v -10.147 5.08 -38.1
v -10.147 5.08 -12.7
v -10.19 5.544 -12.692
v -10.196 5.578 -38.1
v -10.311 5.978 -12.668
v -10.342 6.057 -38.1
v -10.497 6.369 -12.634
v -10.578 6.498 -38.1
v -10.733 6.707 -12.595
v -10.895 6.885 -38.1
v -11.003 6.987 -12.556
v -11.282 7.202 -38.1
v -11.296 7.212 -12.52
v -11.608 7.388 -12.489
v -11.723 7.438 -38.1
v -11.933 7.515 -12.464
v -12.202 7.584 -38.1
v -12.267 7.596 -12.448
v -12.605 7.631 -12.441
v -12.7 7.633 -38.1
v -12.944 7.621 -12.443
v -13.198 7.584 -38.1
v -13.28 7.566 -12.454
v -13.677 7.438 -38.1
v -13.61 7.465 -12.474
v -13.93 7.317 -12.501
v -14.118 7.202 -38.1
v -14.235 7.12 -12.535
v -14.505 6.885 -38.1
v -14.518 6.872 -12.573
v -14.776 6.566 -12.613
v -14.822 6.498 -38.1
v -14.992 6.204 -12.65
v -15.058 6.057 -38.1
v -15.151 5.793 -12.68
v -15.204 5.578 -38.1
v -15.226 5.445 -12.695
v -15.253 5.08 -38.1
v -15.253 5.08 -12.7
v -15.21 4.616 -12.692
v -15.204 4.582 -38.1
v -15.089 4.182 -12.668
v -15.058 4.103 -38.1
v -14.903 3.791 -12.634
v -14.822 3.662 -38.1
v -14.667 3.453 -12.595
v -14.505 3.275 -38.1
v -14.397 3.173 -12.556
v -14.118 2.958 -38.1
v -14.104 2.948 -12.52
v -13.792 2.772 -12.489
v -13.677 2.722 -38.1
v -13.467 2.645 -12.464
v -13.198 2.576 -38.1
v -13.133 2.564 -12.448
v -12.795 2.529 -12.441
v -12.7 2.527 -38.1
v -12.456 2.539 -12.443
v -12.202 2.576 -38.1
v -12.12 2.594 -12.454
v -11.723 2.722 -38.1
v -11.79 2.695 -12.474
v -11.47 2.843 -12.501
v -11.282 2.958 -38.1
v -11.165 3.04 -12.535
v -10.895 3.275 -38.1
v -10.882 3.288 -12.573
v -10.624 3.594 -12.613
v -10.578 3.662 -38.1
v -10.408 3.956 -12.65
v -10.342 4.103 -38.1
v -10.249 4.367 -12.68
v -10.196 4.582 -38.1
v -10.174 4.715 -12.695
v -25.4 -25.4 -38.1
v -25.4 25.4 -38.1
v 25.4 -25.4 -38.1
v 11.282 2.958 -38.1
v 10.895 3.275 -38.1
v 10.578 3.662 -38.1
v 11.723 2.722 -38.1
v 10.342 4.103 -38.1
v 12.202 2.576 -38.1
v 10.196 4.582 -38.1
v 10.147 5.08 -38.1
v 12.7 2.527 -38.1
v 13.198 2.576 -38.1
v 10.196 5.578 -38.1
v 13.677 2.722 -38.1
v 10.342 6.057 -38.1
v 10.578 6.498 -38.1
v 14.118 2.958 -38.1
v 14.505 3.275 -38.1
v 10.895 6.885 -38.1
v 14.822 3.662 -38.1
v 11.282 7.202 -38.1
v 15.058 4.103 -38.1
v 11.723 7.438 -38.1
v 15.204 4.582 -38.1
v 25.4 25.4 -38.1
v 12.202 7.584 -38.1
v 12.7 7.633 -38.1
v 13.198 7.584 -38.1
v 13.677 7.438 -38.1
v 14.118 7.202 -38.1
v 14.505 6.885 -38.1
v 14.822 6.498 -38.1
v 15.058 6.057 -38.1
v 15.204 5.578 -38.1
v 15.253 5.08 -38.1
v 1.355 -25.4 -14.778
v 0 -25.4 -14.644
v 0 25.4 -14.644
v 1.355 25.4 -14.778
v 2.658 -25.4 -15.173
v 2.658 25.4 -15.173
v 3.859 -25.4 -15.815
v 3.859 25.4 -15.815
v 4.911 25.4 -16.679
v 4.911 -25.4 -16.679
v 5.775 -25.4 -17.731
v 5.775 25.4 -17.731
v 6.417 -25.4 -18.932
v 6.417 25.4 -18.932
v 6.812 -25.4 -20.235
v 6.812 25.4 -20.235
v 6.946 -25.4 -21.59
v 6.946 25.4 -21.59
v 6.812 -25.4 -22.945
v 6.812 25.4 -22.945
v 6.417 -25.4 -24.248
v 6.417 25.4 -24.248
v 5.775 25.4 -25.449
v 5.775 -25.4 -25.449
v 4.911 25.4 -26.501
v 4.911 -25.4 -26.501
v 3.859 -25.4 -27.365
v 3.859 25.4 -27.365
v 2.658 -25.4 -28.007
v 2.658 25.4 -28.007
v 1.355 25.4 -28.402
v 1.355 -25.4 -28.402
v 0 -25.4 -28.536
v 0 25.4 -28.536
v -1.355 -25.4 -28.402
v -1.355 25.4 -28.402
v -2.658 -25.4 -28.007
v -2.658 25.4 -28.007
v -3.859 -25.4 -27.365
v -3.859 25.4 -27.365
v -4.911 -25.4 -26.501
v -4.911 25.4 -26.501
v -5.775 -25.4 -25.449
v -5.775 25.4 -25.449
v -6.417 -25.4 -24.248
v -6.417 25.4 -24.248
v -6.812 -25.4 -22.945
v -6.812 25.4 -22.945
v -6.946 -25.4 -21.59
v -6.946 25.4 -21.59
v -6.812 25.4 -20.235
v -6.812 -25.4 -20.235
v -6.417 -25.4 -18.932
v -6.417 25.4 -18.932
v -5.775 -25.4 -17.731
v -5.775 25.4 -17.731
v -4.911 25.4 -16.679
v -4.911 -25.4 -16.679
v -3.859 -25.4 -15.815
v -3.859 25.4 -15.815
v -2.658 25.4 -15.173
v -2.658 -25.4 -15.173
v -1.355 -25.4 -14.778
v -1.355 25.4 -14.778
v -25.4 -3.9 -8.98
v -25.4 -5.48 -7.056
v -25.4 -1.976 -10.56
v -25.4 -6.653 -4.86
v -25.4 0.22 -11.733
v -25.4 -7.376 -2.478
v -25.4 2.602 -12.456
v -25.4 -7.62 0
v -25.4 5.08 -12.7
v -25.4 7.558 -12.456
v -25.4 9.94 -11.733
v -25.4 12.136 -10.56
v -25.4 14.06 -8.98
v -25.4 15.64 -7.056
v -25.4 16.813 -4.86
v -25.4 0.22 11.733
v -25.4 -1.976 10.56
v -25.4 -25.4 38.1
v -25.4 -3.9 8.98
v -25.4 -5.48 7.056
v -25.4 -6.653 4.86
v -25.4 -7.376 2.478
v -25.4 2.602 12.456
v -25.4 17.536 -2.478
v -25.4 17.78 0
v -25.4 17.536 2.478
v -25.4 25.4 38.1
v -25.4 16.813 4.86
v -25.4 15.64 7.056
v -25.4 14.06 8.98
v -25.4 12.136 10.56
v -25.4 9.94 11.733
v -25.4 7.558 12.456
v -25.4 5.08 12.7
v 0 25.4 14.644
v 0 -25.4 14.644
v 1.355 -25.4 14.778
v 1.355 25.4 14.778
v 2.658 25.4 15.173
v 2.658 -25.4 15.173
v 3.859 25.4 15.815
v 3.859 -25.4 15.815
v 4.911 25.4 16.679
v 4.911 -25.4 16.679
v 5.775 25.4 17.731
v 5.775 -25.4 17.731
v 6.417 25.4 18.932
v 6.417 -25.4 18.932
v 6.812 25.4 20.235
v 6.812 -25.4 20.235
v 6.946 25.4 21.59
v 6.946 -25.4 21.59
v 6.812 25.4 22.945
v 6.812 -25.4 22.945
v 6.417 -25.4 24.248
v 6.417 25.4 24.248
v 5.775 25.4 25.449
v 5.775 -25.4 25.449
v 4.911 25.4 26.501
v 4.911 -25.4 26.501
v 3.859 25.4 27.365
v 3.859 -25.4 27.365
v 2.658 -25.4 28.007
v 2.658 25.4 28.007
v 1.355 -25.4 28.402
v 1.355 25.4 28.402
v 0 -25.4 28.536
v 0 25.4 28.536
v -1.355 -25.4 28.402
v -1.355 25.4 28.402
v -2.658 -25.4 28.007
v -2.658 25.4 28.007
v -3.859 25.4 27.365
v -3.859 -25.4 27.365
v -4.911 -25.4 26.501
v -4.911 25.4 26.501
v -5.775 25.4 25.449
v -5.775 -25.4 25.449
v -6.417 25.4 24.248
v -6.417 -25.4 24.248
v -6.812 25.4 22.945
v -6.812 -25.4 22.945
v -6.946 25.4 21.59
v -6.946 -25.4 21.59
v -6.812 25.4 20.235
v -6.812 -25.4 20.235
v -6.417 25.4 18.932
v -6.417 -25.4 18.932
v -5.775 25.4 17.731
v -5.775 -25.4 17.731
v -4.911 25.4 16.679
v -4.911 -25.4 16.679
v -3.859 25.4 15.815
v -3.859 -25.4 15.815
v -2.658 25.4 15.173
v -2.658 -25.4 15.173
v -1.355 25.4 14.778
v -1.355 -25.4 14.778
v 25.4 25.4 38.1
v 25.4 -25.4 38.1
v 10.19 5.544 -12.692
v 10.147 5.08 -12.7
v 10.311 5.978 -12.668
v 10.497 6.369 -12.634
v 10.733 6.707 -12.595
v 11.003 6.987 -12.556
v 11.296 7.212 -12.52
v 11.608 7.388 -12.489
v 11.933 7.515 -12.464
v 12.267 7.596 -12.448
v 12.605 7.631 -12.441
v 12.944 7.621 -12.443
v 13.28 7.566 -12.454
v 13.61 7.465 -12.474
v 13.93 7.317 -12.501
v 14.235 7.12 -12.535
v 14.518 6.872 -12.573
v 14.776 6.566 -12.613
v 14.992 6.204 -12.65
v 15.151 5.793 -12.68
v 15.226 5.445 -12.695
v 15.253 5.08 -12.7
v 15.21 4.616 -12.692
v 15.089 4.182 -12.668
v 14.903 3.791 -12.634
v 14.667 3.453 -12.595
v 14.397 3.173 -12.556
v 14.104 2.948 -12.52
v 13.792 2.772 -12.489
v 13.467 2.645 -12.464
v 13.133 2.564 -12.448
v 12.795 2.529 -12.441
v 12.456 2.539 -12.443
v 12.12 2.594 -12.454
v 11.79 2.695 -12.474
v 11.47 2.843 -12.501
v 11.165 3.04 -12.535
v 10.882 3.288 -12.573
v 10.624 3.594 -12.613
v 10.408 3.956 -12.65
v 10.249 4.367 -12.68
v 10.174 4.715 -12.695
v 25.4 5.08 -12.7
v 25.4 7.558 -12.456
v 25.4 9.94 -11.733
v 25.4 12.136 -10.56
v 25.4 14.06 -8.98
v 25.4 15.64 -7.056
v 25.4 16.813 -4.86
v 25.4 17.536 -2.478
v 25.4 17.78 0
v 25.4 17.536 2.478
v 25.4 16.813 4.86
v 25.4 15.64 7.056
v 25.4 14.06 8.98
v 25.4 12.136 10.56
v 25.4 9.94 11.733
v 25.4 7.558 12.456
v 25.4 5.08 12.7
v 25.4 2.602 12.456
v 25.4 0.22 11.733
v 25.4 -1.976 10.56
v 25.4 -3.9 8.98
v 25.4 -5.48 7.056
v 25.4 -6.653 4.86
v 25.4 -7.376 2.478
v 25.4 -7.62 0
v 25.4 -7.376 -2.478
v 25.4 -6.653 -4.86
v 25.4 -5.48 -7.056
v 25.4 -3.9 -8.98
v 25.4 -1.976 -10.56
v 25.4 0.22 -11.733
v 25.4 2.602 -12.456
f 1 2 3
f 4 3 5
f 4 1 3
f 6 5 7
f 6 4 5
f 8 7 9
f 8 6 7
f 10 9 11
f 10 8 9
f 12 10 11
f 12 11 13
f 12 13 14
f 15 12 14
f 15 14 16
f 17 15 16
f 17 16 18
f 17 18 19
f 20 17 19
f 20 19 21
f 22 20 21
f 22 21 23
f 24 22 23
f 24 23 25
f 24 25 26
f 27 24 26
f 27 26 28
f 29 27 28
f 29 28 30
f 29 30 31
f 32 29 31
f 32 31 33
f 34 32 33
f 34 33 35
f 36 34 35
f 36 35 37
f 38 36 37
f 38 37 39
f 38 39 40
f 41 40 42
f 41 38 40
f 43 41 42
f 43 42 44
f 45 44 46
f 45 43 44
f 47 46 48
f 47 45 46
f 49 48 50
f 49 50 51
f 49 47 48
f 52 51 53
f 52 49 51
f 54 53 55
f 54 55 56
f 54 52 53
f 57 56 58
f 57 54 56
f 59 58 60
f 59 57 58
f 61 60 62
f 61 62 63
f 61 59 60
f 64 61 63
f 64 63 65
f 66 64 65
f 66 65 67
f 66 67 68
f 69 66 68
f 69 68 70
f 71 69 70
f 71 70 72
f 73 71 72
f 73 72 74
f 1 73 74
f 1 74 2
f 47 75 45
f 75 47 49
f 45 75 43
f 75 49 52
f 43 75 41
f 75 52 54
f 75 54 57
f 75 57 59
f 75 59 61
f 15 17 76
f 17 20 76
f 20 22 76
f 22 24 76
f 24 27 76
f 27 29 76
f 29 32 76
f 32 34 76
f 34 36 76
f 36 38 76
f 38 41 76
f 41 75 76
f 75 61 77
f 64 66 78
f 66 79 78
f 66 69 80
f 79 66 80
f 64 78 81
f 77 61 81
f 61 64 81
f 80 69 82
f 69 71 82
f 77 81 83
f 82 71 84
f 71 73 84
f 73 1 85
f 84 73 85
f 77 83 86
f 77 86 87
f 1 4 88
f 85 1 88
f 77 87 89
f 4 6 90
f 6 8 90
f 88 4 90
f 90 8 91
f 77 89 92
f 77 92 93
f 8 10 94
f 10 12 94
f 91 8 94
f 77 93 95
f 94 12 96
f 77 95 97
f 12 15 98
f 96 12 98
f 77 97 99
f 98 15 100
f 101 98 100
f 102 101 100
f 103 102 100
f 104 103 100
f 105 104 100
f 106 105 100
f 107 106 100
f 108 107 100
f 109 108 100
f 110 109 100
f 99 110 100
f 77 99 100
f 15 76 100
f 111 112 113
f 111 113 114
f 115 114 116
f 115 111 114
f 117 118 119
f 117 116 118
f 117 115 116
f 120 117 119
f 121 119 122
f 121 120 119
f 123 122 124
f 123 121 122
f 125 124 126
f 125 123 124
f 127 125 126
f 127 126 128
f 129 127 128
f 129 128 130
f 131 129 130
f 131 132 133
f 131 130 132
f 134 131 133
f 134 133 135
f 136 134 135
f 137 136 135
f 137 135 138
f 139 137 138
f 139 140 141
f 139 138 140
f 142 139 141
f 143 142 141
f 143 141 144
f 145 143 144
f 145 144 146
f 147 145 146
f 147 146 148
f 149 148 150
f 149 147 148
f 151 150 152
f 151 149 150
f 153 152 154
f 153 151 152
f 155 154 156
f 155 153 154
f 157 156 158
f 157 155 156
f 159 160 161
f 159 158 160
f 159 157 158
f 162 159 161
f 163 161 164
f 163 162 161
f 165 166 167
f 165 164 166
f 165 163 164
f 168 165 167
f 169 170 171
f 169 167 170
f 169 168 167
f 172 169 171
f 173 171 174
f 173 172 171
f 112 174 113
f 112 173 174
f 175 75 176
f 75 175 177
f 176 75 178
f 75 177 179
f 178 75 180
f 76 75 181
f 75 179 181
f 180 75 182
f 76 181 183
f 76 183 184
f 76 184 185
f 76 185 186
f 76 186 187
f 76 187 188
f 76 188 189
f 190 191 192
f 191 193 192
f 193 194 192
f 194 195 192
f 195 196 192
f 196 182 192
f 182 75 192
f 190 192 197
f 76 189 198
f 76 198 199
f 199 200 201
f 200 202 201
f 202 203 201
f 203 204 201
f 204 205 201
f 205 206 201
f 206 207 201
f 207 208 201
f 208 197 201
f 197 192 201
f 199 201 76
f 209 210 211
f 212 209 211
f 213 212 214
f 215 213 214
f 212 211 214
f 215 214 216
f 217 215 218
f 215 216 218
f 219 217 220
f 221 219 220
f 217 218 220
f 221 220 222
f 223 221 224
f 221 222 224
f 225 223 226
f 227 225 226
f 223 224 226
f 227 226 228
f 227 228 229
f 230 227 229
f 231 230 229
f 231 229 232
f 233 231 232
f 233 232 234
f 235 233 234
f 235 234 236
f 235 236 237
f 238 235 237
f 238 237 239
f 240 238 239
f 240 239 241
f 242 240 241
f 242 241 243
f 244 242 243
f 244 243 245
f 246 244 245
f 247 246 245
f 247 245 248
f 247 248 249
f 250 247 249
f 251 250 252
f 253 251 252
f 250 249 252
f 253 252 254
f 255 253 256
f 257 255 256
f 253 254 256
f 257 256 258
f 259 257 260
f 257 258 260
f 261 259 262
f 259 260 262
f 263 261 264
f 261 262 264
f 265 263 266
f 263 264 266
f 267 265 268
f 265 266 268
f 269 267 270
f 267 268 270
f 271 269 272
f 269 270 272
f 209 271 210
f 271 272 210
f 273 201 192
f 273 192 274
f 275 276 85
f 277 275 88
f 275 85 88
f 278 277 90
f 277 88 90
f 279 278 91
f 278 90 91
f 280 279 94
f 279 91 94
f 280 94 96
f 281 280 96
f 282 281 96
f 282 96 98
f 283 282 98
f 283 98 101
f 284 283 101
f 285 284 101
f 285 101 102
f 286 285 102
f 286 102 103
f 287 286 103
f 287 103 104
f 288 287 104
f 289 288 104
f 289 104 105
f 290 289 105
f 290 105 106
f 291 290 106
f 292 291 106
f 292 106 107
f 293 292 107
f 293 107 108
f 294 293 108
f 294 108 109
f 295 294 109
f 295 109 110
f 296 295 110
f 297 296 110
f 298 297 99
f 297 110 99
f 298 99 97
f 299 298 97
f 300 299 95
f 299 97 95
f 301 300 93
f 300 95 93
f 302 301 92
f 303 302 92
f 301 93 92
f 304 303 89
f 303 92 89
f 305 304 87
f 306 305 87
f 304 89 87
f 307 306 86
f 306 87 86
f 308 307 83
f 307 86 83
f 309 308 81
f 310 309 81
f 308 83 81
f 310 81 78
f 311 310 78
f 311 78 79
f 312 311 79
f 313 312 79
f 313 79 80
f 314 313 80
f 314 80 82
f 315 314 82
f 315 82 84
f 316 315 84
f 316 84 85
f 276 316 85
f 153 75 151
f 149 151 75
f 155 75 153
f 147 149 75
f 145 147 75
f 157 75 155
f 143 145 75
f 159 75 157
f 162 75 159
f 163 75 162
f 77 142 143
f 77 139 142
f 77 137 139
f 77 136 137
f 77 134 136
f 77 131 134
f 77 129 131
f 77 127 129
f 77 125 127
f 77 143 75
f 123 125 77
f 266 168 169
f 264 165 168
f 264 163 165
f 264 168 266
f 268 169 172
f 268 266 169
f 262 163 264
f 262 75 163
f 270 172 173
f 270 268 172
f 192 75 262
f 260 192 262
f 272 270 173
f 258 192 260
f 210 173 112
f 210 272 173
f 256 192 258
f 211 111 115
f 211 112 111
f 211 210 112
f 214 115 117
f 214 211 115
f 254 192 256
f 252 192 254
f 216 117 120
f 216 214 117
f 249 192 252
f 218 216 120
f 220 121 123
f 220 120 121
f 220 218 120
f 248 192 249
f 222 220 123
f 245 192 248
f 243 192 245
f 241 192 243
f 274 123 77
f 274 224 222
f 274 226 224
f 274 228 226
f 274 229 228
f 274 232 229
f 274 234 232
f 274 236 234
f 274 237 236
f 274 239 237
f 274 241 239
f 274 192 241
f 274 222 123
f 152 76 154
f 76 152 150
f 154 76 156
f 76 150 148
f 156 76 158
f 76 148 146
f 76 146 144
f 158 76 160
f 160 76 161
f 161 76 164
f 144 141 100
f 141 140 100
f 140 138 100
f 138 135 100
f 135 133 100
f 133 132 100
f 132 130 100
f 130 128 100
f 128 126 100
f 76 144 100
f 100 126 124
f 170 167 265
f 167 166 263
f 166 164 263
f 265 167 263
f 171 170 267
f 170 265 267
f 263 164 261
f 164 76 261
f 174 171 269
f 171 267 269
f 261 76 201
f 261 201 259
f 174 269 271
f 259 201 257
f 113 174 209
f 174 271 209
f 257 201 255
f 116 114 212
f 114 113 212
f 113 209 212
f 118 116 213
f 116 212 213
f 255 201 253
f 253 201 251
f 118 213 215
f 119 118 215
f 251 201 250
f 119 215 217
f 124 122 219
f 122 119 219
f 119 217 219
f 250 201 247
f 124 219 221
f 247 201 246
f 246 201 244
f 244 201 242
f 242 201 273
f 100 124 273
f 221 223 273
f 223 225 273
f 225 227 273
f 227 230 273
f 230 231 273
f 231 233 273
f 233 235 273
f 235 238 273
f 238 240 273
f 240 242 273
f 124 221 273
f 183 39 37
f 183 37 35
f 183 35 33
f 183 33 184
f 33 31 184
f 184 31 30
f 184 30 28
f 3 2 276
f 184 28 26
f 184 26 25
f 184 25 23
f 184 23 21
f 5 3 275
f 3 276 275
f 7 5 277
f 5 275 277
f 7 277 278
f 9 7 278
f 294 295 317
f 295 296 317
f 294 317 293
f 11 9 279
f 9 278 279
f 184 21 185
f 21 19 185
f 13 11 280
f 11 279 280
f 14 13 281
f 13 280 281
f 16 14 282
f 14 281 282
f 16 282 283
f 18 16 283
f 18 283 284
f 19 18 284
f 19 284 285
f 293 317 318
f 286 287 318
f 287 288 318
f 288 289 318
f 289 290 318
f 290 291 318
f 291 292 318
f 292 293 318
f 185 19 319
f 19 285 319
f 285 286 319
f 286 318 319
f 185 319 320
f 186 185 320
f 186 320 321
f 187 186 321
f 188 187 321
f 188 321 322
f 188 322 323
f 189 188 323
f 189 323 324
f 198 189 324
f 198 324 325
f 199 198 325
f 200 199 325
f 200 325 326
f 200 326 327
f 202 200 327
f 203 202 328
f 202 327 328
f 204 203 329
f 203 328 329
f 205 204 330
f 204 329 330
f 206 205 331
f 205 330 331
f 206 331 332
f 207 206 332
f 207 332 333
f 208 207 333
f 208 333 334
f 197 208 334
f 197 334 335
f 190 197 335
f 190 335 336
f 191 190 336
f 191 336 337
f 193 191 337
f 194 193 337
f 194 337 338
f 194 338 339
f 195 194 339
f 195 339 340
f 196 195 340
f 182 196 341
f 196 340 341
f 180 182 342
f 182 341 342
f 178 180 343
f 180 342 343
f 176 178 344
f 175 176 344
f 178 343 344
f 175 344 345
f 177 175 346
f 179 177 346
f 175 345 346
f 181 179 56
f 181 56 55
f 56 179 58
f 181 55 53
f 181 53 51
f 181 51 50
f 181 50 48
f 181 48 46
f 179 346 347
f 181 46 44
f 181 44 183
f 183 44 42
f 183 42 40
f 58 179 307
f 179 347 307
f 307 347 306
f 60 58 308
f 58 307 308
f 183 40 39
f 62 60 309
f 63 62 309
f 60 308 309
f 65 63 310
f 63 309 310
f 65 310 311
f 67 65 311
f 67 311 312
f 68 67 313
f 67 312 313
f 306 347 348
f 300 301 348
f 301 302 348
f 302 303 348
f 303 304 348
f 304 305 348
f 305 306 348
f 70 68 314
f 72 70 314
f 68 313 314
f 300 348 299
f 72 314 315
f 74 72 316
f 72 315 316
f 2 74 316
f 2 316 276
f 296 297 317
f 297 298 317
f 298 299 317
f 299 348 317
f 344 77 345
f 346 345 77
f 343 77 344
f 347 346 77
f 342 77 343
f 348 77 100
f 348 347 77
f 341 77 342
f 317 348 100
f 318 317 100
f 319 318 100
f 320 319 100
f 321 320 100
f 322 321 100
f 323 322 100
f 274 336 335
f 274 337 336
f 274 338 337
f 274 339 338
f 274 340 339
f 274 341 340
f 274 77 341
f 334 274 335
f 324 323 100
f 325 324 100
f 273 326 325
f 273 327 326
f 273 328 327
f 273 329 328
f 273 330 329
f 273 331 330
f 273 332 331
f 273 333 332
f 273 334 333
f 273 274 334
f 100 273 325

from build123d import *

# Parameters (mm, degrees)
SKETCH1_W                    = 50.8
SKETCH1_H                    = 50.8
EXTRUDE1_DEPTH               = 38.1
SKETCH2_R                    = 12.7
EXTRUDE2_DEPTH               = 69.391593051
F_1_2_CLEARANCE_HOLE1_D      = 13.89126
F_1_4_20_TAPPED_HOLE1_REACH  = 92.482
F_1_4_20_TAPPED_HOLE1_BORE_R = 2.5527


with BuildPart() as part:
    # Sketch1 → Extrude1 (new, symmetric)
    with BuildSketch(Plane.XY):
        Rectangle(SKETCH1_W, SKETCH1_H)
    extrude(amount=EXTRUDE1_DEPTH, both=True)

    # Sketch2 → Extrude2 (cut, through all)
    with BuildSketch(Plane(origin=(25.4, 0, 0), x_dir=(0, 0, -1), z_dir=(1, 0, 0))):
        with Locations((0, 5.08)):
            Circle(SKETCH2_R)
    extrude(amount=-EXTRUDE2_DEPTH, mode=Mode.SUBTRACT)

    # 1/2 Clearance Hole1 (through all)
    with Locations(Plane(origin=(0, 25.4, 21.59), x_dir=(0, 0, 1), z_dir=(0, 1, 0))):
        with Locations((0, 0)):
            f_1_2_clearance_hole1 = Hole(F_1_2_CLEARANCE_HOLE1_D / 2)

    # Mirror1: 1/2 Clearance Hole1 across plane
    add(f_1_2_clearance_hole1.mirror(Plane.XY), mode=Mode.SUBTRACT)

    # 1/4-20 Tapped Hole1 bore (on position points) → 1/4-20 Tapped Hole1 (cut, up to next)
    with BuildSketch(Plane(origin=(12.7, 5.08, -38.1), x_dir=(-1, 0, 0), z_dir=(0, 0, -1)), mode=Mode.PRIVATE) as f_1_4_20_tapped_hole1_sk1:
        Circle(F_1_4_20_TAPPED_HOLE1_BORE_R)
    f_1_4_20_tapped_hole1_tool1 = extrude(f_1_4_20_tapped_hole1_sk1.sketch, amount=-F_1_4_20_TAPPED_HOLE1_REACH, mode=Mode.PRIVATE) & part.part
    f_1_4_20_tapped_hole1 = f_1_4_20_tapped_hole1_tool1.solids().sort_by_distance((12.7, 5.08, -38.1))[0]
    add(f_1_4_20_tapped_hole1, mode=Mode.SUBTRACT)

    # Mirror2: 1/4-20 Tapped Hole1 across plane
    add(f_1_4_20_tapped_hole1.mirror(Plane(origin=(0, 0, 0), x_dir=(0, 0, 1), z_dir=(1, 0, 0))), mode=Mode.SUBTRACT)


solid = part.part
